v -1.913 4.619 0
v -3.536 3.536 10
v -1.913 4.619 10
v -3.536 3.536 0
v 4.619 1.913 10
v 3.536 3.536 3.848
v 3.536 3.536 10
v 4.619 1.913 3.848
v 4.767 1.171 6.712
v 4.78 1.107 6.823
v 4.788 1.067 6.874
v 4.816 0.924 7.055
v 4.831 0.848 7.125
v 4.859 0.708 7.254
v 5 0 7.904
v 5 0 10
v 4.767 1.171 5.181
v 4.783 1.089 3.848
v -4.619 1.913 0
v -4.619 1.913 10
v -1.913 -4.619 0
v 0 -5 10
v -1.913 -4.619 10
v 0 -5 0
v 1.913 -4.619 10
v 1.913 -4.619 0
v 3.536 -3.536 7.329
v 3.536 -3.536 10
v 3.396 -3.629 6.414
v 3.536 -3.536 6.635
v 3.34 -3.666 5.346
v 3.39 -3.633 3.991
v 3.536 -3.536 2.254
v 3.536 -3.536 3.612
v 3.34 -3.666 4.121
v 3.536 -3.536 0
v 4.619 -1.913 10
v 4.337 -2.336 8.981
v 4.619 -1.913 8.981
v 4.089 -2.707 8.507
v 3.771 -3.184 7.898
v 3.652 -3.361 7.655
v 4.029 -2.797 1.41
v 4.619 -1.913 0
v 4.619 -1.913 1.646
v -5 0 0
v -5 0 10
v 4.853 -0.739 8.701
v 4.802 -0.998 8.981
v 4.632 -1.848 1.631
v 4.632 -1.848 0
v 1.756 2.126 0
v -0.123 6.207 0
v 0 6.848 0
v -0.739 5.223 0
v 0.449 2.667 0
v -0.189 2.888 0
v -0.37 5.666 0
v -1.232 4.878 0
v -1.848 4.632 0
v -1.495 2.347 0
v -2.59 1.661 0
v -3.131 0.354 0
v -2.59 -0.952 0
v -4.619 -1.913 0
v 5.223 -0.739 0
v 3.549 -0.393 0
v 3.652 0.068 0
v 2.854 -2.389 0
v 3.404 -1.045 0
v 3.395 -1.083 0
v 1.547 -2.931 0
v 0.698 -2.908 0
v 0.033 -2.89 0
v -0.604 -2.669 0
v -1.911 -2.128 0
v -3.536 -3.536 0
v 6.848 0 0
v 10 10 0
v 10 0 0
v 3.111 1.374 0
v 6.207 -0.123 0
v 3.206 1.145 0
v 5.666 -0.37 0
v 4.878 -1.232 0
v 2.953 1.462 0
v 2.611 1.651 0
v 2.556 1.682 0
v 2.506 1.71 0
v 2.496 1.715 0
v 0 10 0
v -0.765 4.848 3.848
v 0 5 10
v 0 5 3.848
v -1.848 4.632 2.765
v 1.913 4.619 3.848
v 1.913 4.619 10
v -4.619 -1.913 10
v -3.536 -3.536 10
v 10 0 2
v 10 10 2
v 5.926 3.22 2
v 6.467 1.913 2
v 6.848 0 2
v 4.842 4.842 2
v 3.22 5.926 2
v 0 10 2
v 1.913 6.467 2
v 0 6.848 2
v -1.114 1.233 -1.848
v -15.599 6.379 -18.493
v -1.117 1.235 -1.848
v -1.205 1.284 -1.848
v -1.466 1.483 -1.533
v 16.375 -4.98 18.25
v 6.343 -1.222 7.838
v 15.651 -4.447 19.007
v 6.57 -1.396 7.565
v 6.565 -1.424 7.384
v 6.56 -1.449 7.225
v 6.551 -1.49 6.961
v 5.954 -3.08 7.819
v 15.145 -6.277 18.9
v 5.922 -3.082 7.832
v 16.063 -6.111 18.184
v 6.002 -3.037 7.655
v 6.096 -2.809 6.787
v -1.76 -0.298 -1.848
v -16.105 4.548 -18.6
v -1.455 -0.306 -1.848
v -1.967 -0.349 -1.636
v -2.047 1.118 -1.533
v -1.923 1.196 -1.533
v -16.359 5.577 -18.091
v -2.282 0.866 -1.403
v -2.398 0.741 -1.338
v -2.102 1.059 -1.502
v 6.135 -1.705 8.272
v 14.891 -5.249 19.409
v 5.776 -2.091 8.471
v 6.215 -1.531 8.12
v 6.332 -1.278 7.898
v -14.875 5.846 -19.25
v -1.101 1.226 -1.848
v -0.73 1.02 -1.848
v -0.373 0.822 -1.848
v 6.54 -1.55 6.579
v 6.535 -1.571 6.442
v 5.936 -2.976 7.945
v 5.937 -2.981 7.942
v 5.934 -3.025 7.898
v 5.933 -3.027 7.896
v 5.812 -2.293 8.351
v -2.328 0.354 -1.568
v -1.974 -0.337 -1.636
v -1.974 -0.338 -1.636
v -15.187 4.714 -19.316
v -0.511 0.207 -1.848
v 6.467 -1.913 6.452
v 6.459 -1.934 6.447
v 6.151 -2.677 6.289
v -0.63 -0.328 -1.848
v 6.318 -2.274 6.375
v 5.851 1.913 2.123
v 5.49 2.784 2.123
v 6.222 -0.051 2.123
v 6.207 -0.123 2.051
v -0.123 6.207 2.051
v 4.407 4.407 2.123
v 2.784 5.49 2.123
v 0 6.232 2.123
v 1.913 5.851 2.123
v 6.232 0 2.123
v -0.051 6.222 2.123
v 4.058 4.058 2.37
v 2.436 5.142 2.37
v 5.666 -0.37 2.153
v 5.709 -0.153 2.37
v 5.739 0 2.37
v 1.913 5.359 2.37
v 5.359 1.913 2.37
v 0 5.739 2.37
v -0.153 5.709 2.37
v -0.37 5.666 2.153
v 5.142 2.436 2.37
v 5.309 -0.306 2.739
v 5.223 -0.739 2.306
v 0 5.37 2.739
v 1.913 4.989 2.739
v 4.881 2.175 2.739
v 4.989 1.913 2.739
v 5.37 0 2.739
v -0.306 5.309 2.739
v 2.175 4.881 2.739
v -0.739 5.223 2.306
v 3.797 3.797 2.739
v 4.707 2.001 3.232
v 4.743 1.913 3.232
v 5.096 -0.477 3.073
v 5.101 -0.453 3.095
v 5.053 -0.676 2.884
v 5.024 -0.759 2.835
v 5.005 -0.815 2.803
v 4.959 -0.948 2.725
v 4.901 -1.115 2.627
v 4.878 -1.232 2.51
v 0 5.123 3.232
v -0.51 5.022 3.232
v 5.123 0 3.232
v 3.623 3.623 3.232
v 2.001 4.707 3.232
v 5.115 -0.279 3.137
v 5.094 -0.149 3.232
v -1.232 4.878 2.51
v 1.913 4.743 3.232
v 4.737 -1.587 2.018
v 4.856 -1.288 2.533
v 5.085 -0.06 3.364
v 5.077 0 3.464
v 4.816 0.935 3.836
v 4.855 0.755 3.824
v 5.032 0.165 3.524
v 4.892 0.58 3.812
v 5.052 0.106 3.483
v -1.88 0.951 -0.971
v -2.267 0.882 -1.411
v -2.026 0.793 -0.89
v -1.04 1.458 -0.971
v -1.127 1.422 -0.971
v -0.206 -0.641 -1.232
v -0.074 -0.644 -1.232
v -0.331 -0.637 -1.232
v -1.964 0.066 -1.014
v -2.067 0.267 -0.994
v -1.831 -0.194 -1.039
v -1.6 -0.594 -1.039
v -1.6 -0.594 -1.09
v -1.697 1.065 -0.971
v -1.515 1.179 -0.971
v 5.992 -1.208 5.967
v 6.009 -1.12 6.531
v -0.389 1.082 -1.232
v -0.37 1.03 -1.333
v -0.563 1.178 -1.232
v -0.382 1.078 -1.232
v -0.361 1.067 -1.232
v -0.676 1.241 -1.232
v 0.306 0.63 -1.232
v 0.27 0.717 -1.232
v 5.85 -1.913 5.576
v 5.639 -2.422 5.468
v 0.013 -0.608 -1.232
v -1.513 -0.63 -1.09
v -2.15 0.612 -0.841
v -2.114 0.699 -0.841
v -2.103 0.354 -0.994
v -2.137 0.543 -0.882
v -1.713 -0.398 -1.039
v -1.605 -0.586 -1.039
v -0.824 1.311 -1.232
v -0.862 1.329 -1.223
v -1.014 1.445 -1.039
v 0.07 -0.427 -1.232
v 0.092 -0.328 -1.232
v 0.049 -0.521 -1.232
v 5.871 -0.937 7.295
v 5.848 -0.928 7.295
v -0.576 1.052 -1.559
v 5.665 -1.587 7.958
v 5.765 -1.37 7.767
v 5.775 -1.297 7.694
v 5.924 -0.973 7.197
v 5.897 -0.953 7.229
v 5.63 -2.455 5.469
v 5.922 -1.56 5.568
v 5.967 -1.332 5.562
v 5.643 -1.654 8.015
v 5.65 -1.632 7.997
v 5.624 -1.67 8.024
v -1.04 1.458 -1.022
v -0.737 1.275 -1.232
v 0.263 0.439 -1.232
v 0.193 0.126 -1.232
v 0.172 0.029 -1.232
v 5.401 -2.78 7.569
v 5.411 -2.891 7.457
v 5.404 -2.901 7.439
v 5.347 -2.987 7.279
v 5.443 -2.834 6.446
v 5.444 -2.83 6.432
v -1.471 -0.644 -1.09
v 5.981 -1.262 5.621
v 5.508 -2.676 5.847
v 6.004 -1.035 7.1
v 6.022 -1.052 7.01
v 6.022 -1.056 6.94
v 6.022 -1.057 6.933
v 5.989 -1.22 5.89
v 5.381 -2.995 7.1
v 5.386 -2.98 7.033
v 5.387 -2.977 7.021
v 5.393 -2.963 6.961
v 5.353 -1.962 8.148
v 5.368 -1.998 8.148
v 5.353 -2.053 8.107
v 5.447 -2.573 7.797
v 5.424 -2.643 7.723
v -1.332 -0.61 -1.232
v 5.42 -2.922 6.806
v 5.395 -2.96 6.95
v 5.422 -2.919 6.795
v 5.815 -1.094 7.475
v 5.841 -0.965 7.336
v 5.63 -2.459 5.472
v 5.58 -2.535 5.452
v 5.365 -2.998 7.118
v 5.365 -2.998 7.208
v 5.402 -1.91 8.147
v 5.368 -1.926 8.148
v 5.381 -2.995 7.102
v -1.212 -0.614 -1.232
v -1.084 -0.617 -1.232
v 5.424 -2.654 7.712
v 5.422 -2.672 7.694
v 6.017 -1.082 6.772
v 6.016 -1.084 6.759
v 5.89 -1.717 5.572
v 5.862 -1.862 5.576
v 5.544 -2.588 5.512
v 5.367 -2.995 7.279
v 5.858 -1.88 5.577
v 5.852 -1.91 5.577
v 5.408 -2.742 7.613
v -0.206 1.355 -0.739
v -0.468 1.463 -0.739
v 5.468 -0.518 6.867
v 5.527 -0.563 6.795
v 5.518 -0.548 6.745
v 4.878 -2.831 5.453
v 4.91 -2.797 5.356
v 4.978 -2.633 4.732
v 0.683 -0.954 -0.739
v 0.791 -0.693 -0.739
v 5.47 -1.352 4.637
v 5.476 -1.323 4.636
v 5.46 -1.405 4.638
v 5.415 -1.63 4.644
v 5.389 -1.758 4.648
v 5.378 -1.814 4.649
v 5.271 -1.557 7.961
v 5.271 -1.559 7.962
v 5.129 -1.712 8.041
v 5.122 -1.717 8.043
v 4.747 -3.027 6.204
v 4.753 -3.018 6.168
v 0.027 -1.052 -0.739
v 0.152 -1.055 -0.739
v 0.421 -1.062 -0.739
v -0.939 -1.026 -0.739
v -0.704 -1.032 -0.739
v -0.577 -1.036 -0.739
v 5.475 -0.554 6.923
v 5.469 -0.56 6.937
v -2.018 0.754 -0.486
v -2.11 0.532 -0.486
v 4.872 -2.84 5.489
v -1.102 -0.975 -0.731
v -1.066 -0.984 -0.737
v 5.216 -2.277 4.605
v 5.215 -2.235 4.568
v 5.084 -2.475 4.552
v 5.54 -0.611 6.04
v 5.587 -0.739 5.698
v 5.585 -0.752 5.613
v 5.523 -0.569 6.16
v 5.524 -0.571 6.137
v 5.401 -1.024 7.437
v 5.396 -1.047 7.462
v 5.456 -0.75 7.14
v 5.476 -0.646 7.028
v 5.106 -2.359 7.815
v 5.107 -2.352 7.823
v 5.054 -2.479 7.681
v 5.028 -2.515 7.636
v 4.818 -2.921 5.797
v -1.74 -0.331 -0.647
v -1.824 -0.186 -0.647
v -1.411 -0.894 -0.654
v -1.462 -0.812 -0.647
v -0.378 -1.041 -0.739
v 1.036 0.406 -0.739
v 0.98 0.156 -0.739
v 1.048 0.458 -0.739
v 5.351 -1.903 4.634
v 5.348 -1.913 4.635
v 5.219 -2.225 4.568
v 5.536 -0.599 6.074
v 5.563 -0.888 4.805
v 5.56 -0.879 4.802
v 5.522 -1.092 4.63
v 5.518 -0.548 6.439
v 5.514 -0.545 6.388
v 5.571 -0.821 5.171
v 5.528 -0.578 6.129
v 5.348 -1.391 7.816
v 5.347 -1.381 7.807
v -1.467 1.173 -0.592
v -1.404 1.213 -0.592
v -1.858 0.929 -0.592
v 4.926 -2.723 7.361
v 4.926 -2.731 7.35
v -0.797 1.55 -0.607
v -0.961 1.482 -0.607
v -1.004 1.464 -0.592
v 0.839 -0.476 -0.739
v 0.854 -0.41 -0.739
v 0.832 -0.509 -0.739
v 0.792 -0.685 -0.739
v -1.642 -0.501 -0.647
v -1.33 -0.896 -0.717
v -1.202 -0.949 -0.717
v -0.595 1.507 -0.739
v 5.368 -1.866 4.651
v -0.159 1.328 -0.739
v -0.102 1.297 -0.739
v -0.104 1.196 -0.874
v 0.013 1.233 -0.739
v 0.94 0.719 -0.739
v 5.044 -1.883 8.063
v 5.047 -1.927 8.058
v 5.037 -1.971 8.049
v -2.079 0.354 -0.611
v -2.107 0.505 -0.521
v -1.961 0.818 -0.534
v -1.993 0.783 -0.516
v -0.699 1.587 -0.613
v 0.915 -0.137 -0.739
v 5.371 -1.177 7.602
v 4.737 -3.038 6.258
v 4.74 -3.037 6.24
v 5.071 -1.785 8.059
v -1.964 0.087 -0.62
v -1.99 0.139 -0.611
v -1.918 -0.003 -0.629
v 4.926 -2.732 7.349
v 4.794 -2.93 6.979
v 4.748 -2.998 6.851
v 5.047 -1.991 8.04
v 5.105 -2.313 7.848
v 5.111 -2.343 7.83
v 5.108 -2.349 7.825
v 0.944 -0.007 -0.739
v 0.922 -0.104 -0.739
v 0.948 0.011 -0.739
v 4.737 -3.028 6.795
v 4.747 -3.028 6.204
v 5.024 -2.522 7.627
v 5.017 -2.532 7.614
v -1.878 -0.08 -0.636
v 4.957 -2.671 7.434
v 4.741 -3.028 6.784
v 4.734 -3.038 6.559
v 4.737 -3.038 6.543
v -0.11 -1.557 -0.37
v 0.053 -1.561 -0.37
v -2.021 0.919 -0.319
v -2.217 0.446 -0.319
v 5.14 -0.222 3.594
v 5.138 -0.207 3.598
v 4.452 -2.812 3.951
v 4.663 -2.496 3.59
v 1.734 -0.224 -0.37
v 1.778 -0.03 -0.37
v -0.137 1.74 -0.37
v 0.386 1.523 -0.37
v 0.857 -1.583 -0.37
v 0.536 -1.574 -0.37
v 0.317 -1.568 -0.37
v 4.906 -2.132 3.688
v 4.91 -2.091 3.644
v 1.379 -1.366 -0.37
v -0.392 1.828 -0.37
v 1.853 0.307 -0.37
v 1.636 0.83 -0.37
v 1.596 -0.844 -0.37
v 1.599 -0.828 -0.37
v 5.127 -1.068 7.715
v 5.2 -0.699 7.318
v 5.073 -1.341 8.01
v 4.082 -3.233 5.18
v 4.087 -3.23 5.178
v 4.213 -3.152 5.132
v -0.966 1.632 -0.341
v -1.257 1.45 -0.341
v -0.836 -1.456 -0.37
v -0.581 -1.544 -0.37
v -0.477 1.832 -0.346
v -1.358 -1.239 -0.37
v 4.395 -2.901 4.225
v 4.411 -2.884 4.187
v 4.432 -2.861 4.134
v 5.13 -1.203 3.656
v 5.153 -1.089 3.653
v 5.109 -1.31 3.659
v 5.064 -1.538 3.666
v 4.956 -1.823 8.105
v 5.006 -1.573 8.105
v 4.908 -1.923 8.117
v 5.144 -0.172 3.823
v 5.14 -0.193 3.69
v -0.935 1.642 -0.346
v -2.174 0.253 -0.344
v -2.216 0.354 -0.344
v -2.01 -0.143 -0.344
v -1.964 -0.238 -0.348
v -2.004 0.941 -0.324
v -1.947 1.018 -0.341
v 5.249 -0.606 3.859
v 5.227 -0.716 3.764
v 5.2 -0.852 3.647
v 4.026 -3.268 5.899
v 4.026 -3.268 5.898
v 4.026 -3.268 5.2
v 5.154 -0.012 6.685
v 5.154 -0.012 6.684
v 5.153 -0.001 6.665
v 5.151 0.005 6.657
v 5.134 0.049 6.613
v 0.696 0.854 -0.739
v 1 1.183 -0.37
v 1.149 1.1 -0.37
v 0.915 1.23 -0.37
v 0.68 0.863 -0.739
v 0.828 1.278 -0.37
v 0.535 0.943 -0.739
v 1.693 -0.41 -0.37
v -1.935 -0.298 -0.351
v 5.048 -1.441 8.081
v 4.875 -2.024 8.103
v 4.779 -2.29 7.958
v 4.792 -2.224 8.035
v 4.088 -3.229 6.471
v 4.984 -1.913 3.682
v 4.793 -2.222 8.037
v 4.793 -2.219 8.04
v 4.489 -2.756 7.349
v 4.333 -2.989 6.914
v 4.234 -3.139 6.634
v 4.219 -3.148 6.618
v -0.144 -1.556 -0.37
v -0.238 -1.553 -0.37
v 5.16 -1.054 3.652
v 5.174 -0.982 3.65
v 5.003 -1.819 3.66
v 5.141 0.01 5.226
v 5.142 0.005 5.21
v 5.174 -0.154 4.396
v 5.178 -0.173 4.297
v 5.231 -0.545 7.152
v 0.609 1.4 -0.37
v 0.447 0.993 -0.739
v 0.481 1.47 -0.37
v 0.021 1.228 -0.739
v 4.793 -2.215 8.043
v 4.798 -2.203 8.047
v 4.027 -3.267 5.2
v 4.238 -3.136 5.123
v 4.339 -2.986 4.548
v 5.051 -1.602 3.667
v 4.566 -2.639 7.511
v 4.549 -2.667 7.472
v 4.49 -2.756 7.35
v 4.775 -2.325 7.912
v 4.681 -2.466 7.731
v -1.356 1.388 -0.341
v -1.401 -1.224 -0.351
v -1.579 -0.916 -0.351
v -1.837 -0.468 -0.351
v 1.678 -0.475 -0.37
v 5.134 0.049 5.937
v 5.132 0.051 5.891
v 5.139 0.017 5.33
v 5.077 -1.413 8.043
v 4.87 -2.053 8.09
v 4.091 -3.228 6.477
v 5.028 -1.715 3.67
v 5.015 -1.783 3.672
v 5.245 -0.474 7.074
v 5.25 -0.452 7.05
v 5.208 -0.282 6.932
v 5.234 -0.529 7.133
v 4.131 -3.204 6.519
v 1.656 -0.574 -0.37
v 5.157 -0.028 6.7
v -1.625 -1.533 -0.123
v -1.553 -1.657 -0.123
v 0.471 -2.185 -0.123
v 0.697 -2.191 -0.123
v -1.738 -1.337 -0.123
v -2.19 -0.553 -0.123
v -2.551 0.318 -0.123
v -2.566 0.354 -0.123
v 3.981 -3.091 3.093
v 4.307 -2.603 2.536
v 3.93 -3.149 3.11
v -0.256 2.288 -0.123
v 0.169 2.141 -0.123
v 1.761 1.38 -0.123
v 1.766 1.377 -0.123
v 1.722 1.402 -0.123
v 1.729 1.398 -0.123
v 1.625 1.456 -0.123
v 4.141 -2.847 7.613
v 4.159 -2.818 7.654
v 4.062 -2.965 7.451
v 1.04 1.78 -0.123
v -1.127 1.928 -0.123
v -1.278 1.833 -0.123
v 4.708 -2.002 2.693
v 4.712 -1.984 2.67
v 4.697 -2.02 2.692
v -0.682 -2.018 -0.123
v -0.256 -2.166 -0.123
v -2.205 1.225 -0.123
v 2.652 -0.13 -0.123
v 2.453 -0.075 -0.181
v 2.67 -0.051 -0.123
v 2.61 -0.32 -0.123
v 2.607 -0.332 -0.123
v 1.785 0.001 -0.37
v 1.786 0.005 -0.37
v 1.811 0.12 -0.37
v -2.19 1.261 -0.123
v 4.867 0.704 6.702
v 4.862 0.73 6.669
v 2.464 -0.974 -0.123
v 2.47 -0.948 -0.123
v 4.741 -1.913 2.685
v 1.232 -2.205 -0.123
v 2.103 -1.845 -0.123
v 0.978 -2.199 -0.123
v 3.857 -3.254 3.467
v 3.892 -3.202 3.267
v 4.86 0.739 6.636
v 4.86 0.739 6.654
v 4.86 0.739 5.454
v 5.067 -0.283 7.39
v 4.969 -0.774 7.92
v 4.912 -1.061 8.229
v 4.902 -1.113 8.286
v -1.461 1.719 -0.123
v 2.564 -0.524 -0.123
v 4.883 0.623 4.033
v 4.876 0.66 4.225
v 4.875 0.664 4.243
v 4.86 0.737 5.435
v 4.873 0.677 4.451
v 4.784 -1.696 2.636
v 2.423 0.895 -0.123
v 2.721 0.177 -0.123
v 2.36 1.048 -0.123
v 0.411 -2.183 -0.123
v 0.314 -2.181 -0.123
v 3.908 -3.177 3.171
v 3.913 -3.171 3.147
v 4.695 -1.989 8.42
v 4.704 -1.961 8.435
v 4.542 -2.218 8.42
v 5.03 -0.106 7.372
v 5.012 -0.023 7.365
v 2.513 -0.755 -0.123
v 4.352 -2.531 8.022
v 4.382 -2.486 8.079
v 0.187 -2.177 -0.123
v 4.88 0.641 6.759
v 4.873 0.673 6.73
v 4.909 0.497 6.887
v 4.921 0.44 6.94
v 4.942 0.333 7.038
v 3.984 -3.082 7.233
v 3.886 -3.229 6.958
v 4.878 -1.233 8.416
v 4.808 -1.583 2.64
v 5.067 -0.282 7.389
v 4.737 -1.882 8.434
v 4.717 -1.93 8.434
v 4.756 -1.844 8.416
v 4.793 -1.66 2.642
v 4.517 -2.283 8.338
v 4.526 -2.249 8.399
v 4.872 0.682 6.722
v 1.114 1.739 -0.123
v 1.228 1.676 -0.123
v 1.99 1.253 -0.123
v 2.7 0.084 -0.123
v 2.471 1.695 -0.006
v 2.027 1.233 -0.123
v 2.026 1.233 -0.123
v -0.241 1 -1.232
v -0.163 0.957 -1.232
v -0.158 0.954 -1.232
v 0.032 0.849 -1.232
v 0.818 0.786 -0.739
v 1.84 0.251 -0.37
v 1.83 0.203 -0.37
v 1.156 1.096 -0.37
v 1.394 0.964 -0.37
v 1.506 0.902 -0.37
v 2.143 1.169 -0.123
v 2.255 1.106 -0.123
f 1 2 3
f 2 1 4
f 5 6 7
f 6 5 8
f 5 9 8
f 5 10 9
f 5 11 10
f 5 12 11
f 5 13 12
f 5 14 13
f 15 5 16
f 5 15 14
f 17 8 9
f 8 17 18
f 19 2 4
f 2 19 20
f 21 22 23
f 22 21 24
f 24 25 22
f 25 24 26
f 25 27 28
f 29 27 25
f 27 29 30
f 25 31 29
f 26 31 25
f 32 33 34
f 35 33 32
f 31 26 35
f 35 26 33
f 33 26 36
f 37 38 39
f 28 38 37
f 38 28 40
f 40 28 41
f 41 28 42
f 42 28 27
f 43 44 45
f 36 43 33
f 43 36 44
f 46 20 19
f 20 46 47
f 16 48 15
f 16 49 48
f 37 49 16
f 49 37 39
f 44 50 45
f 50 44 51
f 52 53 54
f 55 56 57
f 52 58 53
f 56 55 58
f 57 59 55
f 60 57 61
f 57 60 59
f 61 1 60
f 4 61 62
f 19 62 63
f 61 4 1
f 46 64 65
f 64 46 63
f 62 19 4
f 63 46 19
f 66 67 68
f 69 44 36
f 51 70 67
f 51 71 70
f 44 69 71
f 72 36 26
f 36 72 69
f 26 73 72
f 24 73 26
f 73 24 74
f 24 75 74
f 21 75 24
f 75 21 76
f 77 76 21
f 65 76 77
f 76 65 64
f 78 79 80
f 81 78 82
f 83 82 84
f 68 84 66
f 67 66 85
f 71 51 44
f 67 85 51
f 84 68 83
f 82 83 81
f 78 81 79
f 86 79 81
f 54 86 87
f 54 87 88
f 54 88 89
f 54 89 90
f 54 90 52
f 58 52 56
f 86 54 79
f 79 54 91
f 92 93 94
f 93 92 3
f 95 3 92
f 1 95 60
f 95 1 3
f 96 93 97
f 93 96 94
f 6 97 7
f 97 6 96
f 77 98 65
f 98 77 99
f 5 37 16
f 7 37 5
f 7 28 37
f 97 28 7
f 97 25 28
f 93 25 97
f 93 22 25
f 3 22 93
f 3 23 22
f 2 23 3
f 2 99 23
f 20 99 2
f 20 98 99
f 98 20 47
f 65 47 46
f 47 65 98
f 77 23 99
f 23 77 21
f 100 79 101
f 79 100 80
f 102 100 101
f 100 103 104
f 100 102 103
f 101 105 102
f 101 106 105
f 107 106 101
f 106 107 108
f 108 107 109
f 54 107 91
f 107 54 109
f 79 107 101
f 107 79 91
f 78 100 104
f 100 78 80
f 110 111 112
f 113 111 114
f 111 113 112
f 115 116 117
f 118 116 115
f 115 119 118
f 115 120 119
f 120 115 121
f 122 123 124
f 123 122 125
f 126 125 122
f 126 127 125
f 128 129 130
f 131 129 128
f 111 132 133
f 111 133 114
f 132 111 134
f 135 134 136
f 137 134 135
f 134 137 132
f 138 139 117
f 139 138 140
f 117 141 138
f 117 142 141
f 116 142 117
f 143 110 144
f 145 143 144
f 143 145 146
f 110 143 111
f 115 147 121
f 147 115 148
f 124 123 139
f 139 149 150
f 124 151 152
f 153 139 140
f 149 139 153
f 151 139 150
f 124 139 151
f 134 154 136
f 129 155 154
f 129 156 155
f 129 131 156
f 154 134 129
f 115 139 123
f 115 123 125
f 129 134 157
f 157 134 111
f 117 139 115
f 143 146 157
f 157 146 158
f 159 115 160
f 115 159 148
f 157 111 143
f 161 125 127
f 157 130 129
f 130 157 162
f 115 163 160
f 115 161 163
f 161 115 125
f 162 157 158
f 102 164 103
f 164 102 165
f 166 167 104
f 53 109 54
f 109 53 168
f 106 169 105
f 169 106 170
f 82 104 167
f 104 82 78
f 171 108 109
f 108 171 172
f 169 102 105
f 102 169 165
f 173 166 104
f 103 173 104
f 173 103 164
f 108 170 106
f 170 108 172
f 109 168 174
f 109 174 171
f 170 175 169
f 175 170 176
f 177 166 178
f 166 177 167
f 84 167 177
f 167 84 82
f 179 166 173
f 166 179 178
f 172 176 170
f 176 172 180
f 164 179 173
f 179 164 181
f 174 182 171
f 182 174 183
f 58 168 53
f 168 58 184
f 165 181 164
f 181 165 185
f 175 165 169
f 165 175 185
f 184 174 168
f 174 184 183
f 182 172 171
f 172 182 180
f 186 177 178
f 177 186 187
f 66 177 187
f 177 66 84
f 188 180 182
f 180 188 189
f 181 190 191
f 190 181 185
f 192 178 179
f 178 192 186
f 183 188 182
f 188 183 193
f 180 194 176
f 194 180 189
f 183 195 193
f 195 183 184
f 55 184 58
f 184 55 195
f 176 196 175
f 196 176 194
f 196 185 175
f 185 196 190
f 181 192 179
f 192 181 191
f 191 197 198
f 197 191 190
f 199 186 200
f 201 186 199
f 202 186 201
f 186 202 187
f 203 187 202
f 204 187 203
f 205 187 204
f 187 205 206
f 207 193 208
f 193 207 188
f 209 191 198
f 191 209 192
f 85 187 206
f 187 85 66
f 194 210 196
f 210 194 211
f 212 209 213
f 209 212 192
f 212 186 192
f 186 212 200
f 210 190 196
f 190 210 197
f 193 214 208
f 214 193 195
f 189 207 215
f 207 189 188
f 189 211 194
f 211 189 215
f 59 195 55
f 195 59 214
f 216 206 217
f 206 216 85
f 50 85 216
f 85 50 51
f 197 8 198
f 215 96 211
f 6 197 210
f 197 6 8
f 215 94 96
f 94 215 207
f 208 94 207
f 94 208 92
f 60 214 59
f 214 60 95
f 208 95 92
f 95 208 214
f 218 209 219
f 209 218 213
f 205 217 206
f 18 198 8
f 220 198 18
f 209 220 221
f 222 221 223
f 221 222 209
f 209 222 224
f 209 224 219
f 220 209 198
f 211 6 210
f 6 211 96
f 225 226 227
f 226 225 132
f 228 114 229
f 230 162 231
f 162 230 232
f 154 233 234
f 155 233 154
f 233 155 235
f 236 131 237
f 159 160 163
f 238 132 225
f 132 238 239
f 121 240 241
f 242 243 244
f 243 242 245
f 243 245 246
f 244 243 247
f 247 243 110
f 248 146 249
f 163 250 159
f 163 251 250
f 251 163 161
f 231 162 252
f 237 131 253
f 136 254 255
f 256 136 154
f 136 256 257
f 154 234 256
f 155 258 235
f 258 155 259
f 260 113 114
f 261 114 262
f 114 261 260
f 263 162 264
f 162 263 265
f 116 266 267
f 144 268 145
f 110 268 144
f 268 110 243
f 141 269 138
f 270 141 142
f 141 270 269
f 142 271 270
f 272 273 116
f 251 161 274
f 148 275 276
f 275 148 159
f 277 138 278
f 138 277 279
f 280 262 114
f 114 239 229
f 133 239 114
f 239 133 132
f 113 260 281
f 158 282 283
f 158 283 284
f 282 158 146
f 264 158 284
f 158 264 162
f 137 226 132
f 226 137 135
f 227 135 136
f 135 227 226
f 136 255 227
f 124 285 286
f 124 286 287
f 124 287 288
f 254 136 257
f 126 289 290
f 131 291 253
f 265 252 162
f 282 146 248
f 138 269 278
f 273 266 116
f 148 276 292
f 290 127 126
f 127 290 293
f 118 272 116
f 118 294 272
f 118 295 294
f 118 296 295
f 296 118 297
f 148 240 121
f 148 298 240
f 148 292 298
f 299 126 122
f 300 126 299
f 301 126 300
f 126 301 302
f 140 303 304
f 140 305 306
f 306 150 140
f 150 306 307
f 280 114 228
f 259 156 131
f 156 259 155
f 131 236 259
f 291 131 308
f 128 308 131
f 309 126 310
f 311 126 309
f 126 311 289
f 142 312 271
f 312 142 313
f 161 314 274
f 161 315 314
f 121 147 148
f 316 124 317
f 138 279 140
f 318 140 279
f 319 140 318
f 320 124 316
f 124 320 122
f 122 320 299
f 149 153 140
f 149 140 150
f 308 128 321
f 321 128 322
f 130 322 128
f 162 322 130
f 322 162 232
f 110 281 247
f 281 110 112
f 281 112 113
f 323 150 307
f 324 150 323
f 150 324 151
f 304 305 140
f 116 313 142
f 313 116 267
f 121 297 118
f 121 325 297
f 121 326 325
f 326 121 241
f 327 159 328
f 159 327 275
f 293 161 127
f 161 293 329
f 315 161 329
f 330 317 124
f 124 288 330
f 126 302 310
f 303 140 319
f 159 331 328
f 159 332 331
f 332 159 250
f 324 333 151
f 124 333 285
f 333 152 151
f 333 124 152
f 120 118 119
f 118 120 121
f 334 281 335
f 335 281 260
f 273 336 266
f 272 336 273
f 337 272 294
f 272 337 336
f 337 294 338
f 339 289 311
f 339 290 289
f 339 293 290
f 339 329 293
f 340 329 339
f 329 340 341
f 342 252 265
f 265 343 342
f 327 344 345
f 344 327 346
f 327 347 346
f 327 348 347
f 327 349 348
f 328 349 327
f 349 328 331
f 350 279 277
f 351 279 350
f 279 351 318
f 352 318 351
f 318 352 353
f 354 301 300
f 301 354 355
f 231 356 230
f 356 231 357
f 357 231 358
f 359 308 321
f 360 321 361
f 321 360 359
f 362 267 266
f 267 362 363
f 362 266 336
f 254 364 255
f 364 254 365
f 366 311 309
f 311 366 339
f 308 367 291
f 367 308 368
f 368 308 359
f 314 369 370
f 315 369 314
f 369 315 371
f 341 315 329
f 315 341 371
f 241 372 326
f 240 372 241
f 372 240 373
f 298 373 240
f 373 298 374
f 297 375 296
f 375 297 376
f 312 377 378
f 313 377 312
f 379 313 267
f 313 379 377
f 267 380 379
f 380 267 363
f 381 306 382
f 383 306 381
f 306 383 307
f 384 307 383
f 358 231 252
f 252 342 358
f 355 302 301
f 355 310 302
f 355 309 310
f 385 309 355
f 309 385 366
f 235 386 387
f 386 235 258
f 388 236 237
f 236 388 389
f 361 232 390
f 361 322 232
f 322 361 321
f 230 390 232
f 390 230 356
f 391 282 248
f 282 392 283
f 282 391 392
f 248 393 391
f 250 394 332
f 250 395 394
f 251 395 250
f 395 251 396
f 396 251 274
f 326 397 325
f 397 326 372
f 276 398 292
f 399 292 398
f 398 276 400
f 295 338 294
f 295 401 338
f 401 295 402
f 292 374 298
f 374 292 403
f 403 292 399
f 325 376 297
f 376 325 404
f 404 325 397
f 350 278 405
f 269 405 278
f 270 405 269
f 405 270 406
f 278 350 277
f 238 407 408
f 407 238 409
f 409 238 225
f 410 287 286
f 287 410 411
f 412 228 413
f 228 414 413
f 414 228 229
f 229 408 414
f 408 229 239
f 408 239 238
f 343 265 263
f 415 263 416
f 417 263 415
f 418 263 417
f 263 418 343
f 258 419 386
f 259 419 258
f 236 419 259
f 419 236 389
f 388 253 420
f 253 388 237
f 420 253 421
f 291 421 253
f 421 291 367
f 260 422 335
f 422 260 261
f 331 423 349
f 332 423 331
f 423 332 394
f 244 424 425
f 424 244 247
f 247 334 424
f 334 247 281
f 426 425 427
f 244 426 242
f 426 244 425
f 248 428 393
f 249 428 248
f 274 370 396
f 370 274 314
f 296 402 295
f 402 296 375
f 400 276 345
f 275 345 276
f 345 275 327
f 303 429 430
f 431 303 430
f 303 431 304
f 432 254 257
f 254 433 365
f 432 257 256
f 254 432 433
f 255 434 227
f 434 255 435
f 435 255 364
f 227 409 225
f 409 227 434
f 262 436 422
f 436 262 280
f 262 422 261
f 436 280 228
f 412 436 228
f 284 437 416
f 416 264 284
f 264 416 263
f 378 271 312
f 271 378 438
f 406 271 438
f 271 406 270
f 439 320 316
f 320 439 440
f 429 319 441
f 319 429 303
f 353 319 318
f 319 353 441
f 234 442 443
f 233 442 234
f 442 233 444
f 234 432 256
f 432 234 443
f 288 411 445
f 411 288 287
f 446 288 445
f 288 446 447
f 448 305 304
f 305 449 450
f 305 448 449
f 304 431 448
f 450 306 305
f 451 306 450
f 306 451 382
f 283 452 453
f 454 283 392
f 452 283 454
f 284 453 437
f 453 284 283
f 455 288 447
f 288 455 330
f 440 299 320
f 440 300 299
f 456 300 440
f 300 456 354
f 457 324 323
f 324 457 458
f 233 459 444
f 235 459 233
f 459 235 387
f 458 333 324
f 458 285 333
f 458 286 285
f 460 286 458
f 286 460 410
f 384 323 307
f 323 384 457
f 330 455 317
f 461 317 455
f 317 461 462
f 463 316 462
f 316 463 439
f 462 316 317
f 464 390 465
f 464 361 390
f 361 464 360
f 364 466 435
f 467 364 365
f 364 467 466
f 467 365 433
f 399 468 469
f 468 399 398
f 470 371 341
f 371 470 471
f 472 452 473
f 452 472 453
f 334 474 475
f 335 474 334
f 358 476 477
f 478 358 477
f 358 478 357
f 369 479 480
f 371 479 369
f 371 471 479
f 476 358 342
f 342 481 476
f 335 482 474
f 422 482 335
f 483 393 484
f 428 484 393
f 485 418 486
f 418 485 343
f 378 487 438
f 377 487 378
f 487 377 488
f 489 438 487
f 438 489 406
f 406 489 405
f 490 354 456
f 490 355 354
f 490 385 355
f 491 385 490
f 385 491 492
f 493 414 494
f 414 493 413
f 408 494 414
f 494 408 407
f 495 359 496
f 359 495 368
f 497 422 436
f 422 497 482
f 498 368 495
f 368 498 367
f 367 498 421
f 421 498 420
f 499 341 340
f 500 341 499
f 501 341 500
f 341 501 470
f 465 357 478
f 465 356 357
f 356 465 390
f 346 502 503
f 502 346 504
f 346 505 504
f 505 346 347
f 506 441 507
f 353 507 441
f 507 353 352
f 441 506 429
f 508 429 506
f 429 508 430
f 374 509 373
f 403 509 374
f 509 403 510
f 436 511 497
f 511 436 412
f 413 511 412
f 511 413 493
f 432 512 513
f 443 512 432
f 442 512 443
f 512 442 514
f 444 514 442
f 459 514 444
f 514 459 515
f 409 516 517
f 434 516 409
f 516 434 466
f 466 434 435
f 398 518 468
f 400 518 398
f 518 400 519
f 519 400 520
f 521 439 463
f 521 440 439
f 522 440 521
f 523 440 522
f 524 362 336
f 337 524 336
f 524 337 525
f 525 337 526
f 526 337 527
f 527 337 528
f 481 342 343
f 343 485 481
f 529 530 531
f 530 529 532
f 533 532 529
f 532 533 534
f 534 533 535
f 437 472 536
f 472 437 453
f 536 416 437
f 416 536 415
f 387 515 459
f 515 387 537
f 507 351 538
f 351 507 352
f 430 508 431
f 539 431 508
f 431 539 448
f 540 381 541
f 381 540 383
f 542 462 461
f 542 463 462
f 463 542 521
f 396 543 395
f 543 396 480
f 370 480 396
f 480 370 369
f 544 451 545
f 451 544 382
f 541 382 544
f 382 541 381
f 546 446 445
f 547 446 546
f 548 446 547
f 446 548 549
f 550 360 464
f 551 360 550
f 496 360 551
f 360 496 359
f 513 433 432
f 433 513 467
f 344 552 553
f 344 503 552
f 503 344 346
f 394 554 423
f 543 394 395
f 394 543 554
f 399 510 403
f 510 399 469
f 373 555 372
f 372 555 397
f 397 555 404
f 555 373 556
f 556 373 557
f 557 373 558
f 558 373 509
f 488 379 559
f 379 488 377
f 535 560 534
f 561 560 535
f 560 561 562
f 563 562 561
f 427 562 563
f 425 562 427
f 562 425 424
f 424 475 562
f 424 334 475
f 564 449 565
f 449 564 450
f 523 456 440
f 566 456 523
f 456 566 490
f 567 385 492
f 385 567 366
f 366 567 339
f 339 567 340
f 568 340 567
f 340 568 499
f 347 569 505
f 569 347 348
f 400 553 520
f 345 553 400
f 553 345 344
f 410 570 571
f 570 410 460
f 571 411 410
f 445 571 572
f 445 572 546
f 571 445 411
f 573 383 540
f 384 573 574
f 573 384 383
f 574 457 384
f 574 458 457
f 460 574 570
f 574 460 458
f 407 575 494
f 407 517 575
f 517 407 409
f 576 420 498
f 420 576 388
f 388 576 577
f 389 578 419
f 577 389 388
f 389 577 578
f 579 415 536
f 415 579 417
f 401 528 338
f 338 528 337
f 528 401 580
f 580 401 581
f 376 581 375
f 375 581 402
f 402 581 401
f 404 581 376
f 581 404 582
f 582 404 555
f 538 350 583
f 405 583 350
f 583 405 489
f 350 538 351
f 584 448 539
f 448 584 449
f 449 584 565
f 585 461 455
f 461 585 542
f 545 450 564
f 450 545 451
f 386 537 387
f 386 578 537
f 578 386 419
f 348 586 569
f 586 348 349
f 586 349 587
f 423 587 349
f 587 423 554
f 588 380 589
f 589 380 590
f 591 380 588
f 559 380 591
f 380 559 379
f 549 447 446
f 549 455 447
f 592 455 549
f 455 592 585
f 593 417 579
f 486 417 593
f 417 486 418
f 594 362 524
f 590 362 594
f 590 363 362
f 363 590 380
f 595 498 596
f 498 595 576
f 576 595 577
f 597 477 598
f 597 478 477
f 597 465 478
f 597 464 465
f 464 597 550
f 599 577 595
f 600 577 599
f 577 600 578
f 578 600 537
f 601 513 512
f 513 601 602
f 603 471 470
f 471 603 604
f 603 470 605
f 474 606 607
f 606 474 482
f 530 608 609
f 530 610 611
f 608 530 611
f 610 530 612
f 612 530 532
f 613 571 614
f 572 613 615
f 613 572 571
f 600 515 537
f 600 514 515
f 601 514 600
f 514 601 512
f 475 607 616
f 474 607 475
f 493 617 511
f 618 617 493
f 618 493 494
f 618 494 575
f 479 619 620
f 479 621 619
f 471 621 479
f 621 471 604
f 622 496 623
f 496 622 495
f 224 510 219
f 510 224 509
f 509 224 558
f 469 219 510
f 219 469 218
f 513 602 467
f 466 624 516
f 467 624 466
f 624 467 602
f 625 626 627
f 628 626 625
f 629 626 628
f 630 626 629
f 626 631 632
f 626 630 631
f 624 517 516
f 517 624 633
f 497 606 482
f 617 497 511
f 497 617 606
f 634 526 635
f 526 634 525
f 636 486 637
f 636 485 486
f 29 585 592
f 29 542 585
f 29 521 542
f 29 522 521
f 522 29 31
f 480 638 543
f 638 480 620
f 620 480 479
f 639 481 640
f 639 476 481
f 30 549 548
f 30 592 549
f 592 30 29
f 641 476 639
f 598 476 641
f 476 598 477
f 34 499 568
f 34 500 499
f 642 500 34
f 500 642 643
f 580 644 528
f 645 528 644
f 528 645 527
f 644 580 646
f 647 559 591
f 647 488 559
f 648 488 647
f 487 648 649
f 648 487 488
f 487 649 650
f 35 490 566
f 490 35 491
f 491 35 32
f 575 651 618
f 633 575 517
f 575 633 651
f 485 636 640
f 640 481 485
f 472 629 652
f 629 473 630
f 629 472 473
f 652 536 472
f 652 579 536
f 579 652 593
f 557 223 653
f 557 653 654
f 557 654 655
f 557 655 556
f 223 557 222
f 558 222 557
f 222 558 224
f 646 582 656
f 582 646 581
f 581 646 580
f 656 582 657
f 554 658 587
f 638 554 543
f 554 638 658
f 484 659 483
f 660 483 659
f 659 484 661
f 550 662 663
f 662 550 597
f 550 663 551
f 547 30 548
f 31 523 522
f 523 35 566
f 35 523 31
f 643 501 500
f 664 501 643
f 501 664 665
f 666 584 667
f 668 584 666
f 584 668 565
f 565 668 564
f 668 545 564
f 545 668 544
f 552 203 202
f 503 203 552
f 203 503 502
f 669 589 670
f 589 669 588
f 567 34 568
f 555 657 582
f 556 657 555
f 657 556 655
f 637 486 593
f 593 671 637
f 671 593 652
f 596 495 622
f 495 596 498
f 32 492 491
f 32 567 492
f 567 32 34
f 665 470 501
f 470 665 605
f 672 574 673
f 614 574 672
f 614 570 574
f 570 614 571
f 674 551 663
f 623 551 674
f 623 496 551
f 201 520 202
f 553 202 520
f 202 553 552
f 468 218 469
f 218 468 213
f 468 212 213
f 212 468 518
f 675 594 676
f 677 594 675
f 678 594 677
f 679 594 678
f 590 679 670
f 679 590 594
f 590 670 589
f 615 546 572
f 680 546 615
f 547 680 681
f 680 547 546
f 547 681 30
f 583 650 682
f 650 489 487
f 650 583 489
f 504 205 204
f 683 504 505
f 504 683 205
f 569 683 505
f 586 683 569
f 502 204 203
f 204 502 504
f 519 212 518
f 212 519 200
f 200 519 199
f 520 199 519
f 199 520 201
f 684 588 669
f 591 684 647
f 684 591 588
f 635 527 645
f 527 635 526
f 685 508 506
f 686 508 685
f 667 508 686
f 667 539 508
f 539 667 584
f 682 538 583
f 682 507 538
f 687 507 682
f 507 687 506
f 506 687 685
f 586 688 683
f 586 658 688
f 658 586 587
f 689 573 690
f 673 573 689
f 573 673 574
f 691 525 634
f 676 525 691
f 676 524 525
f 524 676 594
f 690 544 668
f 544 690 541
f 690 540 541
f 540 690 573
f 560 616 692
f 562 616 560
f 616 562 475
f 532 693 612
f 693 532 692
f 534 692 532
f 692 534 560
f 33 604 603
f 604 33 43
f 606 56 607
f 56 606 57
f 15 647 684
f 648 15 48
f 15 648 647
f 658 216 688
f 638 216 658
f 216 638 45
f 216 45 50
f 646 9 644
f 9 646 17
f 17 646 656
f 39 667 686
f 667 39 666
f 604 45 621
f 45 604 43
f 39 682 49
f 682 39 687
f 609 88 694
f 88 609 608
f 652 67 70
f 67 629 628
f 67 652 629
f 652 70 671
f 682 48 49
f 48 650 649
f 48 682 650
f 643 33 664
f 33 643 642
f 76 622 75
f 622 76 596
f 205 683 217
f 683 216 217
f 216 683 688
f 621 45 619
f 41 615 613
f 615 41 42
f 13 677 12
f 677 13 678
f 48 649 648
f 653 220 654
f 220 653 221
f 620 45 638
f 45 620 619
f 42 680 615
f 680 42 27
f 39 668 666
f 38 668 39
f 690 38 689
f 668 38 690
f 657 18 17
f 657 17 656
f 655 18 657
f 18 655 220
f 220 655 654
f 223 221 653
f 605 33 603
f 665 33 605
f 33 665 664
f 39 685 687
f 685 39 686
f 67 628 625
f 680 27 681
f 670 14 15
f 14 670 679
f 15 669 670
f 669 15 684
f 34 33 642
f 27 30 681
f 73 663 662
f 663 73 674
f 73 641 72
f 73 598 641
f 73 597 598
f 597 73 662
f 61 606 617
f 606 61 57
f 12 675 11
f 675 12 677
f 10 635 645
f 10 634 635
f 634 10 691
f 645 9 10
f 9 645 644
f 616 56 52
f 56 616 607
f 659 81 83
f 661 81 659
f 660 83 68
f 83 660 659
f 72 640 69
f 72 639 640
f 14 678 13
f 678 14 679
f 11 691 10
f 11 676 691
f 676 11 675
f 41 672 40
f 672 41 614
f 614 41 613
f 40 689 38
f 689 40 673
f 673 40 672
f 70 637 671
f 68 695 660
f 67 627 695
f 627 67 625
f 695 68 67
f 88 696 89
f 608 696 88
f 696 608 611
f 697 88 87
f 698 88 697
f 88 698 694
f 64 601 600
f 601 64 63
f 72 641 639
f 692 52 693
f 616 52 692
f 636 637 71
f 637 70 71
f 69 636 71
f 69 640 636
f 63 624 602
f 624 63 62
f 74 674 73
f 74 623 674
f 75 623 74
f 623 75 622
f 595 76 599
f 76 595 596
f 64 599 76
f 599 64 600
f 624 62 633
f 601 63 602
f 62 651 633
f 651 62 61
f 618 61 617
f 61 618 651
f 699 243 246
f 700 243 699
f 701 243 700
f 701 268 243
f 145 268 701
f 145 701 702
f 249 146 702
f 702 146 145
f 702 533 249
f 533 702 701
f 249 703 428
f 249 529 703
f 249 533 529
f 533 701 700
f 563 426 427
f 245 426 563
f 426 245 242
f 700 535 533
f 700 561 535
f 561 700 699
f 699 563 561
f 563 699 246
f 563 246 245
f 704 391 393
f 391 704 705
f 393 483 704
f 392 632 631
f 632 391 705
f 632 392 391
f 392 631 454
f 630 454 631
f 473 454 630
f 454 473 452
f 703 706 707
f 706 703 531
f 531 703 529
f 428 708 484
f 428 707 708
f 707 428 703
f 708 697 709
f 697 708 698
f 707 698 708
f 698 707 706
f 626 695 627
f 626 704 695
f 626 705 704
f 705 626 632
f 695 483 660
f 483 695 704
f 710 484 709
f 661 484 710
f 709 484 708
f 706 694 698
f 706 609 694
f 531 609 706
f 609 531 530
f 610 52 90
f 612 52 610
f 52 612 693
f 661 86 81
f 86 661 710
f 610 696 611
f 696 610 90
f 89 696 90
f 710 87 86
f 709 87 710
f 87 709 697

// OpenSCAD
// Fillet function
// from https://github.com/clothbot/ClothBotCreations/blob/master/utilities/fillet.scad

module fillet(r=1.0,steps=3,include=true) {
  if(include) for (k=[0:$children-1]) {
	children(k);
  }
  for (i=[0:$children-2] ) {
    for(j=[i+1:$children-1] ) {
	fillet_two(r=r,steps=steps) {
	  children(i);
	  children(j);
	  intersection() {
		children(i);
		children(j);
	  }
	}
    }
  }
}

module fillet_two(r=1.0,steps=3) {
  for(step=[1:steps]) {
	hull() {
	  render() intersection() {
		children(0);
		offset_3d(r=r*step/steps) children(2);
	  }
	  render() intersection() {
		children(1);
		offset_3d(r=r*(steps-step+1)/steps) children(2);
	  }
	}
  }
}

module offset_3d(r=1.0) {
  for(k=[0:$children-1]) minkowski() {
	children(k);
	sphere(r=r,$fn=8);
  }
}

fillet(r=2,steps=5) {
	cylinder(r=5,h=10);
	cube([10,10,2]);
	rotate([30,30,30]) cylinder(r=1.0,h=50,center=true);
}
